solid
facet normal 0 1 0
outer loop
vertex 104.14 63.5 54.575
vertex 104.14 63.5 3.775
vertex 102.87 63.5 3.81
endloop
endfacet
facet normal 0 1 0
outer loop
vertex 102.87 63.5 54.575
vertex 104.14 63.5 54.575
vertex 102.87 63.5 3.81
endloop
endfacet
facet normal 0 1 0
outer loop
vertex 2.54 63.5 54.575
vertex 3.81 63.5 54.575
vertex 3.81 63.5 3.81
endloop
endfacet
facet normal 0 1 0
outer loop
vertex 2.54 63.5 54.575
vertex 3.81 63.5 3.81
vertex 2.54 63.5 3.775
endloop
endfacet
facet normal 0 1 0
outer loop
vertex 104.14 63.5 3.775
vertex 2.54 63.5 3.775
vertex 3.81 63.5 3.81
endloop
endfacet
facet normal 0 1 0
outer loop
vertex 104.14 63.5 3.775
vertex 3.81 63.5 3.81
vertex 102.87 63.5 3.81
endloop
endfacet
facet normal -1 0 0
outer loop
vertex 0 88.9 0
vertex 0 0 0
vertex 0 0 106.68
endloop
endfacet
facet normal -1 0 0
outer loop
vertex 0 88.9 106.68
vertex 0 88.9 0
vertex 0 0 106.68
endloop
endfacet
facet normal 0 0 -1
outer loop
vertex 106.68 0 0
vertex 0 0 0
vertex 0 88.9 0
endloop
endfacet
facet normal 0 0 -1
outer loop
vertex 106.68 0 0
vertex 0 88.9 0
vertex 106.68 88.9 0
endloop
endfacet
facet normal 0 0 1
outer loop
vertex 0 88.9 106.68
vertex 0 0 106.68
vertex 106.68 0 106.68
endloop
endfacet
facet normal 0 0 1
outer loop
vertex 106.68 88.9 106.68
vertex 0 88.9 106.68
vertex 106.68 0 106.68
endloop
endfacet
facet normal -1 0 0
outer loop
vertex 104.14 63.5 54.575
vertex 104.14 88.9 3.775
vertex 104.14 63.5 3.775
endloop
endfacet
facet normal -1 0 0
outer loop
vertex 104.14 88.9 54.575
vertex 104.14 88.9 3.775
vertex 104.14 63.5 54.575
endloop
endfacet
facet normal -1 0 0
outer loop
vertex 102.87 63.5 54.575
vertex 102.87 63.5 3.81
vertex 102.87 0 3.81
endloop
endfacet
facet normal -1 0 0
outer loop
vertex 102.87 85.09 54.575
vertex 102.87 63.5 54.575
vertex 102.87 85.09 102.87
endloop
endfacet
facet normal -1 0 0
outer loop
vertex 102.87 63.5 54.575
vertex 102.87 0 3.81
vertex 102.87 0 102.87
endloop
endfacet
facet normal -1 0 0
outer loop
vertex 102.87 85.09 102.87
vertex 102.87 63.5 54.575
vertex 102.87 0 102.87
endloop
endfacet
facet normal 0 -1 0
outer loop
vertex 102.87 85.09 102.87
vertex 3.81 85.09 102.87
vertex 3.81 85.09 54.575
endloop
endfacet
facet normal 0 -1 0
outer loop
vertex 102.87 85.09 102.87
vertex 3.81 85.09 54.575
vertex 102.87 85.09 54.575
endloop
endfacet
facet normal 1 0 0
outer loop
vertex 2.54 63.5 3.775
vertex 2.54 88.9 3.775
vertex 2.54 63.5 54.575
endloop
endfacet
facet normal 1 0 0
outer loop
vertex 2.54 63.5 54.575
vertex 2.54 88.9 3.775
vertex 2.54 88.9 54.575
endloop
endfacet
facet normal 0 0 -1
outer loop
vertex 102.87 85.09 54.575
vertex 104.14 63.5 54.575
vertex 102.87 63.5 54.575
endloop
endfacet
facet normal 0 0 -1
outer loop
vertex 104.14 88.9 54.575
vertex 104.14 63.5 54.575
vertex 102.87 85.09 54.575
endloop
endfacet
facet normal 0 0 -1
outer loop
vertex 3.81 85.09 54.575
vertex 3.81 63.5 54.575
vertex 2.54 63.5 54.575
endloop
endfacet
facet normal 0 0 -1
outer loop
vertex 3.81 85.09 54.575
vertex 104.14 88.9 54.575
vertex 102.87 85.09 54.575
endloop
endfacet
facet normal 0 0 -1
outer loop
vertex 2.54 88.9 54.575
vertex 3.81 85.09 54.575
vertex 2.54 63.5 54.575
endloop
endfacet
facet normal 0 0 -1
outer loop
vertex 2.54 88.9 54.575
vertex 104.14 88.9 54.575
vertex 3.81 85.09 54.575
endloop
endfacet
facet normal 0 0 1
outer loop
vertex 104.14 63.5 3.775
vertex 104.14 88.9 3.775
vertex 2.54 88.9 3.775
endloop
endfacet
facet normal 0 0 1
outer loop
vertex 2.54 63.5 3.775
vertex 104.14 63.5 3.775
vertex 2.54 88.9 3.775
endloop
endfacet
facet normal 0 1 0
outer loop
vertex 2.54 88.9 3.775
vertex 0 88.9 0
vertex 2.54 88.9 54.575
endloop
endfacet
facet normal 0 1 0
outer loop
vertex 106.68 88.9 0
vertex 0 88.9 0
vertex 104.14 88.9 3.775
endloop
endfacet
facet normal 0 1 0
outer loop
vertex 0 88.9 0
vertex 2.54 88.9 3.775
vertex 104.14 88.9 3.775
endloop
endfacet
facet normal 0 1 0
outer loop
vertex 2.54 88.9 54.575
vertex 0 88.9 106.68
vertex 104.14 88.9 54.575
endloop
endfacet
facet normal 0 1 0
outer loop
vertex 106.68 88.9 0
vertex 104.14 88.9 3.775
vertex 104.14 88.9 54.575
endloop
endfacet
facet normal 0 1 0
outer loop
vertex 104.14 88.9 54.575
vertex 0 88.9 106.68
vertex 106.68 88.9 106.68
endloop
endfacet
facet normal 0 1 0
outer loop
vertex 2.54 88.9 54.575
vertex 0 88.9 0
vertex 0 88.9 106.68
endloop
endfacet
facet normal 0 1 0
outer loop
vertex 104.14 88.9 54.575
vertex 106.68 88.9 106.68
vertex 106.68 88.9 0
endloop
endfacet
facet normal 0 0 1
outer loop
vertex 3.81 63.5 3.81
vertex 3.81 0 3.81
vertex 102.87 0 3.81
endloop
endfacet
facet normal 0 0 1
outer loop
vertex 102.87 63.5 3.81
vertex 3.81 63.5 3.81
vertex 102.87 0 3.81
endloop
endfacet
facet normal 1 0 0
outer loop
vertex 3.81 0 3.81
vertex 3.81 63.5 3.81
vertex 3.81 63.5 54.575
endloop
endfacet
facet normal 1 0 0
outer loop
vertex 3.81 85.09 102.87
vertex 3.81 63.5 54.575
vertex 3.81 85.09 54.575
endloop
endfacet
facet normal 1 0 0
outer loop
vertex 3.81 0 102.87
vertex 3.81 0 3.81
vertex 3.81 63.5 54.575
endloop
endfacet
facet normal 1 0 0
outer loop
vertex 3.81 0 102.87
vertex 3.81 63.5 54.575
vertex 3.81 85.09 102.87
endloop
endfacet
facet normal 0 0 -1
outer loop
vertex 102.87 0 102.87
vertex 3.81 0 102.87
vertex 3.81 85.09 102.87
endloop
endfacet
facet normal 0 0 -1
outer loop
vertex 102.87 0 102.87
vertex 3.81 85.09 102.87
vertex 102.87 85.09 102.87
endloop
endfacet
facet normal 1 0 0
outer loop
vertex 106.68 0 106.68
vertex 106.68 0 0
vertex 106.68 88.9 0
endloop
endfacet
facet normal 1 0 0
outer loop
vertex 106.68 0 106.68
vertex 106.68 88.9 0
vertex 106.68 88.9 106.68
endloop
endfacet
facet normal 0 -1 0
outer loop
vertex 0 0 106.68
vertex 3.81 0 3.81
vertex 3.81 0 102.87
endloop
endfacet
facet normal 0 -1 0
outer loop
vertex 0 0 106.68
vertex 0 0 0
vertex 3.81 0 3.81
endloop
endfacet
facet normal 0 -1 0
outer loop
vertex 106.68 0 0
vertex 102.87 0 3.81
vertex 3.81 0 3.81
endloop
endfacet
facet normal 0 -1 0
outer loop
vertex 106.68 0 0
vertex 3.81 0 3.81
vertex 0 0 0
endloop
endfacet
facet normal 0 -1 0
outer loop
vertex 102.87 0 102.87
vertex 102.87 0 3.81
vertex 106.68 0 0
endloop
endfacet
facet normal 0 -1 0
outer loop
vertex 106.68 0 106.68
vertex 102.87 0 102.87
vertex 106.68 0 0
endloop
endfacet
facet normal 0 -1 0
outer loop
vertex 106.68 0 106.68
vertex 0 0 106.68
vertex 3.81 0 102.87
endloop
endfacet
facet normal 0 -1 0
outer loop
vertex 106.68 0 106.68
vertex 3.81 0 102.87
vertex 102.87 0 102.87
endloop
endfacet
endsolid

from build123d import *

# Parameters (mm, degrees)
F0_W     = 106.68
F0_H     = 106.68
F1_DEPTH = 88.9
F2_T     = -3.81
F3_W     = 101.6
F3_H     = 50.8
F4_DEPTH = 25.4


with BuildPart() as f1:
    # F0 (on Front) → F1 (new body)
    with BuildSketch(Plane.XZ):
        with Locations((53.34, 53.34)):
            Rectangle(F0_W, F0_H)
    extrude(amount=-F1_DEPTH)

    # F2
    f2_openings = [f1.faces().sort_by_distance(p)[0] for p in [
        (53.34, 0, 53.34),
    ]]
    offset(amount=F2_T, openings=f2_openings)

    # F3 (on face) → F4 (cut)
    with BuildSketch(Plane(origin=(0, 88.9, 0), x_dir=(-1, 0, 0), z_dir=(0, 1, 0))):
        with Locations((-53.34, 29.175188)):
            Rectangle(F3_W, F3_H)
    extrude(amount=-F4_DEPTH, mode=Mode.SUBTRACT)


solid = f1.part
